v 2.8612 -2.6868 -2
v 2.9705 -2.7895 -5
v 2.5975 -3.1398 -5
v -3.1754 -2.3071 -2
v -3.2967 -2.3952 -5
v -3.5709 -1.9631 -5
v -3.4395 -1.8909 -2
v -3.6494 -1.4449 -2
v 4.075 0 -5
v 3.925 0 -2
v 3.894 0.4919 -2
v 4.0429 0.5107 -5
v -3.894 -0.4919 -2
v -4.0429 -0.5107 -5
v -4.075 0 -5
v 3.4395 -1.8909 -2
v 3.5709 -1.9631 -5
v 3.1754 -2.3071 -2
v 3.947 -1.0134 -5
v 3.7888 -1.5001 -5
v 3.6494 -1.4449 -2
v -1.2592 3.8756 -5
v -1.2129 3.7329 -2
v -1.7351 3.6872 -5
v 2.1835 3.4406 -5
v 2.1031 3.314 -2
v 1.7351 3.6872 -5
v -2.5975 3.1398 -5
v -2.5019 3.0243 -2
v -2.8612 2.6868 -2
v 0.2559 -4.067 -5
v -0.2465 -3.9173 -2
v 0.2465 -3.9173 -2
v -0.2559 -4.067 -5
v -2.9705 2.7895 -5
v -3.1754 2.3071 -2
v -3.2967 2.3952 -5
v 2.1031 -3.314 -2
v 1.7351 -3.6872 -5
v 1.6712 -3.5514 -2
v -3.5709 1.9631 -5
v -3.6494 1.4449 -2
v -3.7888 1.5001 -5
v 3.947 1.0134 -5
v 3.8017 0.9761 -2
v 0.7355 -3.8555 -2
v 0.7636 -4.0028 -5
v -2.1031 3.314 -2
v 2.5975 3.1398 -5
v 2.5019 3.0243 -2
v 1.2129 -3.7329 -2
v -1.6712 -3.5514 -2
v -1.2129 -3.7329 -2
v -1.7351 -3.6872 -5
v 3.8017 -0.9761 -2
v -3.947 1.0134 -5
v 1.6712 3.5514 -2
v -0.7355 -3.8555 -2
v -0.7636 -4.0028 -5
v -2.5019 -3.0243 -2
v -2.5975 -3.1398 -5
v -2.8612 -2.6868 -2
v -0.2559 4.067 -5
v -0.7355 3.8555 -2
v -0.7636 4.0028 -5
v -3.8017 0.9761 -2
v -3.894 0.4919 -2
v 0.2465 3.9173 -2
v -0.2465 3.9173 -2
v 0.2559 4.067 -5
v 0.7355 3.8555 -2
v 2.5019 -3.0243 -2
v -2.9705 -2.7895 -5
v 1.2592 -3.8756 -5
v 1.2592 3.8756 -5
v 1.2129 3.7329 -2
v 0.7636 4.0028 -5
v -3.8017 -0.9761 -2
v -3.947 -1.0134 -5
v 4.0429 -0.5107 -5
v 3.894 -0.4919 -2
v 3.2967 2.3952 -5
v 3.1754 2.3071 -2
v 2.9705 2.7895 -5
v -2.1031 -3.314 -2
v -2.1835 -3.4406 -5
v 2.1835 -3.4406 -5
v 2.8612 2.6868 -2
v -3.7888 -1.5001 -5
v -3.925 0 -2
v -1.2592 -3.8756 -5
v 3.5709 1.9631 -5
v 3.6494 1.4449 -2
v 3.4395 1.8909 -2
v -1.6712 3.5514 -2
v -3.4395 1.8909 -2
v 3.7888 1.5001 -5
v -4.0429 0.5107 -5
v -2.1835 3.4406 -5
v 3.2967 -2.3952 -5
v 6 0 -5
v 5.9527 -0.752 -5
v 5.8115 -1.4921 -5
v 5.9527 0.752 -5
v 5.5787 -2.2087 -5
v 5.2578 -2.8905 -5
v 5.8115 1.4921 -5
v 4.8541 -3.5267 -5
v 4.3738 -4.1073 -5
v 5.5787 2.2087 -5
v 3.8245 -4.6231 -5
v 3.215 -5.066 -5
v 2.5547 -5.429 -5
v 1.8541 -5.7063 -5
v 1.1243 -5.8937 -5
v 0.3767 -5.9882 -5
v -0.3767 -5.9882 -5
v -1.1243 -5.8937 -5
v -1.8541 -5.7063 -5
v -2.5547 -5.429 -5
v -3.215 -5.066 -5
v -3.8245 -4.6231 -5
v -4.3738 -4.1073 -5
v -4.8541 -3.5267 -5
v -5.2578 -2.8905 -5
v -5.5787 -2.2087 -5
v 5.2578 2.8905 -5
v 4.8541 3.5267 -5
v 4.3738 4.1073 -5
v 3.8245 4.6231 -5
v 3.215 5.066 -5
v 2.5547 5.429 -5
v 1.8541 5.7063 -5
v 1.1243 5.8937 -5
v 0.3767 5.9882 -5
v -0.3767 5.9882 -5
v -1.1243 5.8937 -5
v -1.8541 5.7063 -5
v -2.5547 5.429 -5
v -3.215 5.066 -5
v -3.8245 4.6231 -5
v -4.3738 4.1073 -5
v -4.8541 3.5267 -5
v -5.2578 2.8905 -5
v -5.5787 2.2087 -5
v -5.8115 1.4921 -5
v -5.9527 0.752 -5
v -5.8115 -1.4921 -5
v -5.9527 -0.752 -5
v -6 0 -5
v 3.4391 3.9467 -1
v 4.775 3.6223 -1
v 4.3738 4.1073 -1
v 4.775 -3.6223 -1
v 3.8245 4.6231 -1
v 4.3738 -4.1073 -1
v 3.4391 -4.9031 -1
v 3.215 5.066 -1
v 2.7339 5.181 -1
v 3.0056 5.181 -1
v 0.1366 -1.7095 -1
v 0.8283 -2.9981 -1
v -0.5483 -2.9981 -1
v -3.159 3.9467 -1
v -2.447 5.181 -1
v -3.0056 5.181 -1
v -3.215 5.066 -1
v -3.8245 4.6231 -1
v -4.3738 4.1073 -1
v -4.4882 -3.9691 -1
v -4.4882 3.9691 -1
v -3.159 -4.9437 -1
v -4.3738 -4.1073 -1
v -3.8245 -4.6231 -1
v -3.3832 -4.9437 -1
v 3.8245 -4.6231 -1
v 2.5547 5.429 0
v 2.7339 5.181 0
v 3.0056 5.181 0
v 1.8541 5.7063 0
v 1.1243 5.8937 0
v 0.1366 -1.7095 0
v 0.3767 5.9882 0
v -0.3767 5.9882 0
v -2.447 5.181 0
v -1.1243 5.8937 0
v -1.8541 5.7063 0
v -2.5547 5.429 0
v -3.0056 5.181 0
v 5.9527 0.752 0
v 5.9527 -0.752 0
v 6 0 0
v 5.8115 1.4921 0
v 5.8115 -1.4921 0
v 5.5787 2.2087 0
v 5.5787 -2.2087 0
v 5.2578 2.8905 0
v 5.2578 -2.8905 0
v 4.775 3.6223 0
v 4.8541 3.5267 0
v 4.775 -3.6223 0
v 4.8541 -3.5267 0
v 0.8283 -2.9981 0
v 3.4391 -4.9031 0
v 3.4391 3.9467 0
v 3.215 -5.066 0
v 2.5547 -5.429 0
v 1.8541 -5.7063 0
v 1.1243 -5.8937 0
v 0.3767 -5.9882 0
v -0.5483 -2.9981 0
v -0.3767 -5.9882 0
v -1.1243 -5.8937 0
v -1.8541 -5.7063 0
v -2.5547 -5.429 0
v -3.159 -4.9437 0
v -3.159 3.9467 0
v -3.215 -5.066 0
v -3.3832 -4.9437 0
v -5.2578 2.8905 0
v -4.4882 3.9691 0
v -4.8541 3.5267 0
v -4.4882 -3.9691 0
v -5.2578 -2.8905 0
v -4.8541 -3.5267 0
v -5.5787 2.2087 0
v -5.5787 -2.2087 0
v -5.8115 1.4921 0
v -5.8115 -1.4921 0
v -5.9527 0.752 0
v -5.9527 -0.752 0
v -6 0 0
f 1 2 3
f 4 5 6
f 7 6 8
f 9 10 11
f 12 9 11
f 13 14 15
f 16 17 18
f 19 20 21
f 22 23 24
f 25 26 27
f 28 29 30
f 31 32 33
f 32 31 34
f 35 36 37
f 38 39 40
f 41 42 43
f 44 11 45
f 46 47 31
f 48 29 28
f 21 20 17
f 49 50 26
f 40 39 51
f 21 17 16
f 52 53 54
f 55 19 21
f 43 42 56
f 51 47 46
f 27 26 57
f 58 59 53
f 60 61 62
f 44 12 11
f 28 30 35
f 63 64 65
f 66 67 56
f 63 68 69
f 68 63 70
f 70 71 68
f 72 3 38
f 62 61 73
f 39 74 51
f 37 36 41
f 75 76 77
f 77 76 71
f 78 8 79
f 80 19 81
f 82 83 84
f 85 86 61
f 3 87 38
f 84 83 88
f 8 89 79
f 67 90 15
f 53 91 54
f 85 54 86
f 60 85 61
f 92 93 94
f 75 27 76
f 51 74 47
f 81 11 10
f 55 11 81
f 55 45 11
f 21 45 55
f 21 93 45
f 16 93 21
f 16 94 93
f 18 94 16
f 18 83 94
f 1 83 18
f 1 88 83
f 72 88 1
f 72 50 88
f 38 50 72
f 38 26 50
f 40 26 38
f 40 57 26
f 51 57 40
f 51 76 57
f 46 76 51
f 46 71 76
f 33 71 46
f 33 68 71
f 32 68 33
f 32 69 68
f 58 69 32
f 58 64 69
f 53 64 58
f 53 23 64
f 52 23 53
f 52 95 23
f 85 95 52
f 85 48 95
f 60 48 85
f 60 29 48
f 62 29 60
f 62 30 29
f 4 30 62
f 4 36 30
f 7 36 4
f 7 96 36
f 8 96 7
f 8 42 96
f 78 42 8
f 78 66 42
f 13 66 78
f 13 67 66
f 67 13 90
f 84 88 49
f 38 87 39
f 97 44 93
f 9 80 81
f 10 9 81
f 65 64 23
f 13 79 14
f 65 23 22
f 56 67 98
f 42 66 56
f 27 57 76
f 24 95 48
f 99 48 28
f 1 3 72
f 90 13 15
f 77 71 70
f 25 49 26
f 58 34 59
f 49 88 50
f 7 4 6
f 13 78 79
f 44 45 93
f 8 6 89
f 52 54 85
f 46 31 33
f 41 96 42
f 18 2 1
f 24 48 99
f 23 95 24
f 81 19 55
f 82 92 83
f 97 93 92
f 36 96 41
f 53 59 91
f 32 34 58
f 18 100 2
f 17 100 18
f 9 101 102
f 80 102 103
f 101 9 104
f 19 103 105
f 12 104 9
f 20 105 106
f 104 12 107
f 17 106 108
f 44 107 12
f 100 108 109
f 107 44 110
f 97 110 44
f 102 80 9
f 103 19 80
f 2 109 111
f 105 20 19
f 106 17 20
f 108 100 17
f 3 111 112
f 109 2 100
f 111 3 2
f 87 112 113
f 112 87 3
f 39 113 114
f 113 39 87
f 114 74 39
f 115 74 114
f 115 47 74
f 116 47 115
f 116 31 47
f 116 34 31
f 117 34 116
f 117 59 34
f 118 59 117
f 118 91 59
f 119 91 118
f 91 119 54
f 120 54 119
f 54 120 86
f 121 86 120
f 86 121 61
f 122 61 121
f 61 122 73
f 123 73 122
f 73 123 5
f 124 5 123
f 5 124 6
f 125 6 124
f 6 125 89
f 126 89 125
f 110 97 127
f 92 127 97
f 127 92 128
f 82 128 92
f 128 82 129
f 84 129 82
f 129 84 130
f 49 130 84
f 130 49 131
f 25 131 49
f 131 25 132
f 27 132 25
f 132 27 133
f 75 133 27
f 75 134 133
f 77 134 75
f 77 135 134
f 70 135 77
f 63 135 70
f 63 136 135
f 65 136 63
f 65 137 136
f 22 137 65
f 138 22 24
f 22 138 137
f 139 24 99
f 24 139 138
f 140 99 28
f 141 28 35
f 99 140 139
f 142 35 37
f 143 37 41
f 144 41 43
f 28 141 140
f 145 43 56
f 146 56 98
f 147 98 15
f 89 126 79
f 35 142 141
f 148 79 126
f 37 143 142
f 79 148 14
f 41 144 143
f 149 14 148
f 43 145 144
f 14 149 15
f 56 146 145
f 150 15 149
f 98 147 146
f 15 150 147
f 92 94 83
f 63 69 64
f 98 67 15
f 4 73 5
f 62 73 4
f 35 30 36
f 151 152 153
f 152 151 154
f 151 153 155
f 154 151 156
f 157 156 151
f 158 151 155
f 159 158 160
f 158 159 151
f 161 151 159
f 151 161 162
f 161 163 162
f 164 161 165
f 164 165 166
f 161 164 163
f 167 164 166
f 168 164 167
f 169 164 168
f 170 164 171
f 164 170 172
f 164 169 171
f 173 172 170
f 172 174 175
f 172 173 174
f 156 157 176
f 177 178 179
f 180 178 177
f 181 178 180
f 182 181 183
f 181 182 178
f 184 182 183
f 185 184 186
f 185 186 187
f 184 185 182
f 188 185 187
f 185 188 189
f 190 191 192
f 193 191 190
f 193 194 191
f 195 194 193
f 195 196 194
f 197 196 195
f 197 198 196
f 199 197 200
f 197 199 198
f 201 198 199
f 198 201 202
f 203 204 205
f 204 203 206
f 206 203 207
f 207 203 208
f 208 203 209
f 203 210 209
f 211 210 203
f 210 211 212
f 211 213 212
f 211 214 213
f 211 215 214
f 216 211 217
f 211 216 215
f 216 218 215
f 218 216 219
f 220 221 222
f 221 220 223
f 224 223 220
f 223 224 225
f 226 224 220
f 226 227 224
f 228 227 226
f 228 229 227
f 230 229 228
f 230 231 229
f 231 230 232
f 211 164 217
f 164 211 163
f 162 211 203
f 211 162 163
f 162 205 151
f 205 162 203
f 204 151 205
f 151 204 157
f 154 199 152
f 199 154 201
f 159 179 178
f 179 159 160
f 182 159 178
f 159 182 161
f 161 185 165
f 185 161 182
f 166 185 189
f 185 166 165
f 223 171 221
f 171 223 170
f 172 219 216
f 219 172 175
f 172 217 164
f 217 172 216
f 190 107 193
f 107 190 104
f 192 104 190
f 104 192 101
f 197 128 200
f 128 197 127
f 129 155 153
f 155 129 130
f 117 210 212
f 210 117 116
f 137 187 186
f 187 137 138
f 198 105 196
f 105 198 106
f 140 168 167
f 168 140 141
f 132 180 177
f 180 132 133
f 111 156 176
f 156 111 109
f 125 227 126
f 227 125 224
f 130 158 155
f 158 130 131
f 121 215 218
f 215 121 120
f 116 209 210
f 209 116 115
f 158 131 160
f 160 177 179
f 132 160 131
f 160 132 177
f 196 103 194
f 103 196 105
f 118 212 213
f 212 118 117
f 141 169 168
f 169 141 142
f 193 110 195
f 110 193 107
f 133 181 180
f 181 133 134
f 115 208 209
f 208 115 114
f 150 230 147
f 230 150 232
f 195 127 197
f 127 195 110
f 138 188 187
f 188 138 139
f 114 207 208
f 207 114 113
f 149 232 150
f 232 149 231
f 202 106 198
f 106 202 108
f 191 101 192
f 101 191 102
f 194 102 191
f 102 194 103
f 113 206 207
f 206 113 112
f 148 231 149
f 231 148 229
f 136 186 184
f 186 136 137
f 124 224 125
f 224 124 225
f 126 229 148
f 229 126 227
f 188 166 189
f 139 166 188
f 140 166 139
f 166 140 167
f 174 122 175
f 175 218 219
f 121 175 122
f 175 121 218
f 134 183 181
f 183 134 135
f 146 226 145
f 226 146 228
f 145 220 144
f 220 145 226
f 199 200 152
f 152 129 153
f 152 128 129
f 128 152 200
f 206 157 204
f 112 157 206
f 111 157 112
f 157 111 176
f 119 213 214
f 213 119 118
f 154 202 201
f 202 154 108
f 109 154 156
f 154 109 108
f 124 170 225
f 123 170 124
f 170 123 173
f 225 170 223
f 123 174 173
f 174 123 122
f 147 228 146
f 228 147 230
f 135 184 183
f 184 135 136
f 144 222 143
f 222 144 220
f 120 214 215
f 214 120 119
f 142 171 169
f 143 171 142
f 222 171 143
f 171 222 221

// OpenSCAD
$fn = 50;

difference() {
	union() {
		translate(v = [0, 0, -5.0]) {
			cylinder(h = 5, r = 6.0);
		}
	}
	union() {
		#translate(v = [0, 0, -5.0]) {
			cylinder(h = 3, r1 = 4.075, r2 = 3.925);
		}
		translate(v = [0, 0, -1]) {
			linear_extrude(height = 1) {
				text(font = "Impact", halign = "center", size = 10, text = "M", valign = "center");
			}
		}
	}
}
